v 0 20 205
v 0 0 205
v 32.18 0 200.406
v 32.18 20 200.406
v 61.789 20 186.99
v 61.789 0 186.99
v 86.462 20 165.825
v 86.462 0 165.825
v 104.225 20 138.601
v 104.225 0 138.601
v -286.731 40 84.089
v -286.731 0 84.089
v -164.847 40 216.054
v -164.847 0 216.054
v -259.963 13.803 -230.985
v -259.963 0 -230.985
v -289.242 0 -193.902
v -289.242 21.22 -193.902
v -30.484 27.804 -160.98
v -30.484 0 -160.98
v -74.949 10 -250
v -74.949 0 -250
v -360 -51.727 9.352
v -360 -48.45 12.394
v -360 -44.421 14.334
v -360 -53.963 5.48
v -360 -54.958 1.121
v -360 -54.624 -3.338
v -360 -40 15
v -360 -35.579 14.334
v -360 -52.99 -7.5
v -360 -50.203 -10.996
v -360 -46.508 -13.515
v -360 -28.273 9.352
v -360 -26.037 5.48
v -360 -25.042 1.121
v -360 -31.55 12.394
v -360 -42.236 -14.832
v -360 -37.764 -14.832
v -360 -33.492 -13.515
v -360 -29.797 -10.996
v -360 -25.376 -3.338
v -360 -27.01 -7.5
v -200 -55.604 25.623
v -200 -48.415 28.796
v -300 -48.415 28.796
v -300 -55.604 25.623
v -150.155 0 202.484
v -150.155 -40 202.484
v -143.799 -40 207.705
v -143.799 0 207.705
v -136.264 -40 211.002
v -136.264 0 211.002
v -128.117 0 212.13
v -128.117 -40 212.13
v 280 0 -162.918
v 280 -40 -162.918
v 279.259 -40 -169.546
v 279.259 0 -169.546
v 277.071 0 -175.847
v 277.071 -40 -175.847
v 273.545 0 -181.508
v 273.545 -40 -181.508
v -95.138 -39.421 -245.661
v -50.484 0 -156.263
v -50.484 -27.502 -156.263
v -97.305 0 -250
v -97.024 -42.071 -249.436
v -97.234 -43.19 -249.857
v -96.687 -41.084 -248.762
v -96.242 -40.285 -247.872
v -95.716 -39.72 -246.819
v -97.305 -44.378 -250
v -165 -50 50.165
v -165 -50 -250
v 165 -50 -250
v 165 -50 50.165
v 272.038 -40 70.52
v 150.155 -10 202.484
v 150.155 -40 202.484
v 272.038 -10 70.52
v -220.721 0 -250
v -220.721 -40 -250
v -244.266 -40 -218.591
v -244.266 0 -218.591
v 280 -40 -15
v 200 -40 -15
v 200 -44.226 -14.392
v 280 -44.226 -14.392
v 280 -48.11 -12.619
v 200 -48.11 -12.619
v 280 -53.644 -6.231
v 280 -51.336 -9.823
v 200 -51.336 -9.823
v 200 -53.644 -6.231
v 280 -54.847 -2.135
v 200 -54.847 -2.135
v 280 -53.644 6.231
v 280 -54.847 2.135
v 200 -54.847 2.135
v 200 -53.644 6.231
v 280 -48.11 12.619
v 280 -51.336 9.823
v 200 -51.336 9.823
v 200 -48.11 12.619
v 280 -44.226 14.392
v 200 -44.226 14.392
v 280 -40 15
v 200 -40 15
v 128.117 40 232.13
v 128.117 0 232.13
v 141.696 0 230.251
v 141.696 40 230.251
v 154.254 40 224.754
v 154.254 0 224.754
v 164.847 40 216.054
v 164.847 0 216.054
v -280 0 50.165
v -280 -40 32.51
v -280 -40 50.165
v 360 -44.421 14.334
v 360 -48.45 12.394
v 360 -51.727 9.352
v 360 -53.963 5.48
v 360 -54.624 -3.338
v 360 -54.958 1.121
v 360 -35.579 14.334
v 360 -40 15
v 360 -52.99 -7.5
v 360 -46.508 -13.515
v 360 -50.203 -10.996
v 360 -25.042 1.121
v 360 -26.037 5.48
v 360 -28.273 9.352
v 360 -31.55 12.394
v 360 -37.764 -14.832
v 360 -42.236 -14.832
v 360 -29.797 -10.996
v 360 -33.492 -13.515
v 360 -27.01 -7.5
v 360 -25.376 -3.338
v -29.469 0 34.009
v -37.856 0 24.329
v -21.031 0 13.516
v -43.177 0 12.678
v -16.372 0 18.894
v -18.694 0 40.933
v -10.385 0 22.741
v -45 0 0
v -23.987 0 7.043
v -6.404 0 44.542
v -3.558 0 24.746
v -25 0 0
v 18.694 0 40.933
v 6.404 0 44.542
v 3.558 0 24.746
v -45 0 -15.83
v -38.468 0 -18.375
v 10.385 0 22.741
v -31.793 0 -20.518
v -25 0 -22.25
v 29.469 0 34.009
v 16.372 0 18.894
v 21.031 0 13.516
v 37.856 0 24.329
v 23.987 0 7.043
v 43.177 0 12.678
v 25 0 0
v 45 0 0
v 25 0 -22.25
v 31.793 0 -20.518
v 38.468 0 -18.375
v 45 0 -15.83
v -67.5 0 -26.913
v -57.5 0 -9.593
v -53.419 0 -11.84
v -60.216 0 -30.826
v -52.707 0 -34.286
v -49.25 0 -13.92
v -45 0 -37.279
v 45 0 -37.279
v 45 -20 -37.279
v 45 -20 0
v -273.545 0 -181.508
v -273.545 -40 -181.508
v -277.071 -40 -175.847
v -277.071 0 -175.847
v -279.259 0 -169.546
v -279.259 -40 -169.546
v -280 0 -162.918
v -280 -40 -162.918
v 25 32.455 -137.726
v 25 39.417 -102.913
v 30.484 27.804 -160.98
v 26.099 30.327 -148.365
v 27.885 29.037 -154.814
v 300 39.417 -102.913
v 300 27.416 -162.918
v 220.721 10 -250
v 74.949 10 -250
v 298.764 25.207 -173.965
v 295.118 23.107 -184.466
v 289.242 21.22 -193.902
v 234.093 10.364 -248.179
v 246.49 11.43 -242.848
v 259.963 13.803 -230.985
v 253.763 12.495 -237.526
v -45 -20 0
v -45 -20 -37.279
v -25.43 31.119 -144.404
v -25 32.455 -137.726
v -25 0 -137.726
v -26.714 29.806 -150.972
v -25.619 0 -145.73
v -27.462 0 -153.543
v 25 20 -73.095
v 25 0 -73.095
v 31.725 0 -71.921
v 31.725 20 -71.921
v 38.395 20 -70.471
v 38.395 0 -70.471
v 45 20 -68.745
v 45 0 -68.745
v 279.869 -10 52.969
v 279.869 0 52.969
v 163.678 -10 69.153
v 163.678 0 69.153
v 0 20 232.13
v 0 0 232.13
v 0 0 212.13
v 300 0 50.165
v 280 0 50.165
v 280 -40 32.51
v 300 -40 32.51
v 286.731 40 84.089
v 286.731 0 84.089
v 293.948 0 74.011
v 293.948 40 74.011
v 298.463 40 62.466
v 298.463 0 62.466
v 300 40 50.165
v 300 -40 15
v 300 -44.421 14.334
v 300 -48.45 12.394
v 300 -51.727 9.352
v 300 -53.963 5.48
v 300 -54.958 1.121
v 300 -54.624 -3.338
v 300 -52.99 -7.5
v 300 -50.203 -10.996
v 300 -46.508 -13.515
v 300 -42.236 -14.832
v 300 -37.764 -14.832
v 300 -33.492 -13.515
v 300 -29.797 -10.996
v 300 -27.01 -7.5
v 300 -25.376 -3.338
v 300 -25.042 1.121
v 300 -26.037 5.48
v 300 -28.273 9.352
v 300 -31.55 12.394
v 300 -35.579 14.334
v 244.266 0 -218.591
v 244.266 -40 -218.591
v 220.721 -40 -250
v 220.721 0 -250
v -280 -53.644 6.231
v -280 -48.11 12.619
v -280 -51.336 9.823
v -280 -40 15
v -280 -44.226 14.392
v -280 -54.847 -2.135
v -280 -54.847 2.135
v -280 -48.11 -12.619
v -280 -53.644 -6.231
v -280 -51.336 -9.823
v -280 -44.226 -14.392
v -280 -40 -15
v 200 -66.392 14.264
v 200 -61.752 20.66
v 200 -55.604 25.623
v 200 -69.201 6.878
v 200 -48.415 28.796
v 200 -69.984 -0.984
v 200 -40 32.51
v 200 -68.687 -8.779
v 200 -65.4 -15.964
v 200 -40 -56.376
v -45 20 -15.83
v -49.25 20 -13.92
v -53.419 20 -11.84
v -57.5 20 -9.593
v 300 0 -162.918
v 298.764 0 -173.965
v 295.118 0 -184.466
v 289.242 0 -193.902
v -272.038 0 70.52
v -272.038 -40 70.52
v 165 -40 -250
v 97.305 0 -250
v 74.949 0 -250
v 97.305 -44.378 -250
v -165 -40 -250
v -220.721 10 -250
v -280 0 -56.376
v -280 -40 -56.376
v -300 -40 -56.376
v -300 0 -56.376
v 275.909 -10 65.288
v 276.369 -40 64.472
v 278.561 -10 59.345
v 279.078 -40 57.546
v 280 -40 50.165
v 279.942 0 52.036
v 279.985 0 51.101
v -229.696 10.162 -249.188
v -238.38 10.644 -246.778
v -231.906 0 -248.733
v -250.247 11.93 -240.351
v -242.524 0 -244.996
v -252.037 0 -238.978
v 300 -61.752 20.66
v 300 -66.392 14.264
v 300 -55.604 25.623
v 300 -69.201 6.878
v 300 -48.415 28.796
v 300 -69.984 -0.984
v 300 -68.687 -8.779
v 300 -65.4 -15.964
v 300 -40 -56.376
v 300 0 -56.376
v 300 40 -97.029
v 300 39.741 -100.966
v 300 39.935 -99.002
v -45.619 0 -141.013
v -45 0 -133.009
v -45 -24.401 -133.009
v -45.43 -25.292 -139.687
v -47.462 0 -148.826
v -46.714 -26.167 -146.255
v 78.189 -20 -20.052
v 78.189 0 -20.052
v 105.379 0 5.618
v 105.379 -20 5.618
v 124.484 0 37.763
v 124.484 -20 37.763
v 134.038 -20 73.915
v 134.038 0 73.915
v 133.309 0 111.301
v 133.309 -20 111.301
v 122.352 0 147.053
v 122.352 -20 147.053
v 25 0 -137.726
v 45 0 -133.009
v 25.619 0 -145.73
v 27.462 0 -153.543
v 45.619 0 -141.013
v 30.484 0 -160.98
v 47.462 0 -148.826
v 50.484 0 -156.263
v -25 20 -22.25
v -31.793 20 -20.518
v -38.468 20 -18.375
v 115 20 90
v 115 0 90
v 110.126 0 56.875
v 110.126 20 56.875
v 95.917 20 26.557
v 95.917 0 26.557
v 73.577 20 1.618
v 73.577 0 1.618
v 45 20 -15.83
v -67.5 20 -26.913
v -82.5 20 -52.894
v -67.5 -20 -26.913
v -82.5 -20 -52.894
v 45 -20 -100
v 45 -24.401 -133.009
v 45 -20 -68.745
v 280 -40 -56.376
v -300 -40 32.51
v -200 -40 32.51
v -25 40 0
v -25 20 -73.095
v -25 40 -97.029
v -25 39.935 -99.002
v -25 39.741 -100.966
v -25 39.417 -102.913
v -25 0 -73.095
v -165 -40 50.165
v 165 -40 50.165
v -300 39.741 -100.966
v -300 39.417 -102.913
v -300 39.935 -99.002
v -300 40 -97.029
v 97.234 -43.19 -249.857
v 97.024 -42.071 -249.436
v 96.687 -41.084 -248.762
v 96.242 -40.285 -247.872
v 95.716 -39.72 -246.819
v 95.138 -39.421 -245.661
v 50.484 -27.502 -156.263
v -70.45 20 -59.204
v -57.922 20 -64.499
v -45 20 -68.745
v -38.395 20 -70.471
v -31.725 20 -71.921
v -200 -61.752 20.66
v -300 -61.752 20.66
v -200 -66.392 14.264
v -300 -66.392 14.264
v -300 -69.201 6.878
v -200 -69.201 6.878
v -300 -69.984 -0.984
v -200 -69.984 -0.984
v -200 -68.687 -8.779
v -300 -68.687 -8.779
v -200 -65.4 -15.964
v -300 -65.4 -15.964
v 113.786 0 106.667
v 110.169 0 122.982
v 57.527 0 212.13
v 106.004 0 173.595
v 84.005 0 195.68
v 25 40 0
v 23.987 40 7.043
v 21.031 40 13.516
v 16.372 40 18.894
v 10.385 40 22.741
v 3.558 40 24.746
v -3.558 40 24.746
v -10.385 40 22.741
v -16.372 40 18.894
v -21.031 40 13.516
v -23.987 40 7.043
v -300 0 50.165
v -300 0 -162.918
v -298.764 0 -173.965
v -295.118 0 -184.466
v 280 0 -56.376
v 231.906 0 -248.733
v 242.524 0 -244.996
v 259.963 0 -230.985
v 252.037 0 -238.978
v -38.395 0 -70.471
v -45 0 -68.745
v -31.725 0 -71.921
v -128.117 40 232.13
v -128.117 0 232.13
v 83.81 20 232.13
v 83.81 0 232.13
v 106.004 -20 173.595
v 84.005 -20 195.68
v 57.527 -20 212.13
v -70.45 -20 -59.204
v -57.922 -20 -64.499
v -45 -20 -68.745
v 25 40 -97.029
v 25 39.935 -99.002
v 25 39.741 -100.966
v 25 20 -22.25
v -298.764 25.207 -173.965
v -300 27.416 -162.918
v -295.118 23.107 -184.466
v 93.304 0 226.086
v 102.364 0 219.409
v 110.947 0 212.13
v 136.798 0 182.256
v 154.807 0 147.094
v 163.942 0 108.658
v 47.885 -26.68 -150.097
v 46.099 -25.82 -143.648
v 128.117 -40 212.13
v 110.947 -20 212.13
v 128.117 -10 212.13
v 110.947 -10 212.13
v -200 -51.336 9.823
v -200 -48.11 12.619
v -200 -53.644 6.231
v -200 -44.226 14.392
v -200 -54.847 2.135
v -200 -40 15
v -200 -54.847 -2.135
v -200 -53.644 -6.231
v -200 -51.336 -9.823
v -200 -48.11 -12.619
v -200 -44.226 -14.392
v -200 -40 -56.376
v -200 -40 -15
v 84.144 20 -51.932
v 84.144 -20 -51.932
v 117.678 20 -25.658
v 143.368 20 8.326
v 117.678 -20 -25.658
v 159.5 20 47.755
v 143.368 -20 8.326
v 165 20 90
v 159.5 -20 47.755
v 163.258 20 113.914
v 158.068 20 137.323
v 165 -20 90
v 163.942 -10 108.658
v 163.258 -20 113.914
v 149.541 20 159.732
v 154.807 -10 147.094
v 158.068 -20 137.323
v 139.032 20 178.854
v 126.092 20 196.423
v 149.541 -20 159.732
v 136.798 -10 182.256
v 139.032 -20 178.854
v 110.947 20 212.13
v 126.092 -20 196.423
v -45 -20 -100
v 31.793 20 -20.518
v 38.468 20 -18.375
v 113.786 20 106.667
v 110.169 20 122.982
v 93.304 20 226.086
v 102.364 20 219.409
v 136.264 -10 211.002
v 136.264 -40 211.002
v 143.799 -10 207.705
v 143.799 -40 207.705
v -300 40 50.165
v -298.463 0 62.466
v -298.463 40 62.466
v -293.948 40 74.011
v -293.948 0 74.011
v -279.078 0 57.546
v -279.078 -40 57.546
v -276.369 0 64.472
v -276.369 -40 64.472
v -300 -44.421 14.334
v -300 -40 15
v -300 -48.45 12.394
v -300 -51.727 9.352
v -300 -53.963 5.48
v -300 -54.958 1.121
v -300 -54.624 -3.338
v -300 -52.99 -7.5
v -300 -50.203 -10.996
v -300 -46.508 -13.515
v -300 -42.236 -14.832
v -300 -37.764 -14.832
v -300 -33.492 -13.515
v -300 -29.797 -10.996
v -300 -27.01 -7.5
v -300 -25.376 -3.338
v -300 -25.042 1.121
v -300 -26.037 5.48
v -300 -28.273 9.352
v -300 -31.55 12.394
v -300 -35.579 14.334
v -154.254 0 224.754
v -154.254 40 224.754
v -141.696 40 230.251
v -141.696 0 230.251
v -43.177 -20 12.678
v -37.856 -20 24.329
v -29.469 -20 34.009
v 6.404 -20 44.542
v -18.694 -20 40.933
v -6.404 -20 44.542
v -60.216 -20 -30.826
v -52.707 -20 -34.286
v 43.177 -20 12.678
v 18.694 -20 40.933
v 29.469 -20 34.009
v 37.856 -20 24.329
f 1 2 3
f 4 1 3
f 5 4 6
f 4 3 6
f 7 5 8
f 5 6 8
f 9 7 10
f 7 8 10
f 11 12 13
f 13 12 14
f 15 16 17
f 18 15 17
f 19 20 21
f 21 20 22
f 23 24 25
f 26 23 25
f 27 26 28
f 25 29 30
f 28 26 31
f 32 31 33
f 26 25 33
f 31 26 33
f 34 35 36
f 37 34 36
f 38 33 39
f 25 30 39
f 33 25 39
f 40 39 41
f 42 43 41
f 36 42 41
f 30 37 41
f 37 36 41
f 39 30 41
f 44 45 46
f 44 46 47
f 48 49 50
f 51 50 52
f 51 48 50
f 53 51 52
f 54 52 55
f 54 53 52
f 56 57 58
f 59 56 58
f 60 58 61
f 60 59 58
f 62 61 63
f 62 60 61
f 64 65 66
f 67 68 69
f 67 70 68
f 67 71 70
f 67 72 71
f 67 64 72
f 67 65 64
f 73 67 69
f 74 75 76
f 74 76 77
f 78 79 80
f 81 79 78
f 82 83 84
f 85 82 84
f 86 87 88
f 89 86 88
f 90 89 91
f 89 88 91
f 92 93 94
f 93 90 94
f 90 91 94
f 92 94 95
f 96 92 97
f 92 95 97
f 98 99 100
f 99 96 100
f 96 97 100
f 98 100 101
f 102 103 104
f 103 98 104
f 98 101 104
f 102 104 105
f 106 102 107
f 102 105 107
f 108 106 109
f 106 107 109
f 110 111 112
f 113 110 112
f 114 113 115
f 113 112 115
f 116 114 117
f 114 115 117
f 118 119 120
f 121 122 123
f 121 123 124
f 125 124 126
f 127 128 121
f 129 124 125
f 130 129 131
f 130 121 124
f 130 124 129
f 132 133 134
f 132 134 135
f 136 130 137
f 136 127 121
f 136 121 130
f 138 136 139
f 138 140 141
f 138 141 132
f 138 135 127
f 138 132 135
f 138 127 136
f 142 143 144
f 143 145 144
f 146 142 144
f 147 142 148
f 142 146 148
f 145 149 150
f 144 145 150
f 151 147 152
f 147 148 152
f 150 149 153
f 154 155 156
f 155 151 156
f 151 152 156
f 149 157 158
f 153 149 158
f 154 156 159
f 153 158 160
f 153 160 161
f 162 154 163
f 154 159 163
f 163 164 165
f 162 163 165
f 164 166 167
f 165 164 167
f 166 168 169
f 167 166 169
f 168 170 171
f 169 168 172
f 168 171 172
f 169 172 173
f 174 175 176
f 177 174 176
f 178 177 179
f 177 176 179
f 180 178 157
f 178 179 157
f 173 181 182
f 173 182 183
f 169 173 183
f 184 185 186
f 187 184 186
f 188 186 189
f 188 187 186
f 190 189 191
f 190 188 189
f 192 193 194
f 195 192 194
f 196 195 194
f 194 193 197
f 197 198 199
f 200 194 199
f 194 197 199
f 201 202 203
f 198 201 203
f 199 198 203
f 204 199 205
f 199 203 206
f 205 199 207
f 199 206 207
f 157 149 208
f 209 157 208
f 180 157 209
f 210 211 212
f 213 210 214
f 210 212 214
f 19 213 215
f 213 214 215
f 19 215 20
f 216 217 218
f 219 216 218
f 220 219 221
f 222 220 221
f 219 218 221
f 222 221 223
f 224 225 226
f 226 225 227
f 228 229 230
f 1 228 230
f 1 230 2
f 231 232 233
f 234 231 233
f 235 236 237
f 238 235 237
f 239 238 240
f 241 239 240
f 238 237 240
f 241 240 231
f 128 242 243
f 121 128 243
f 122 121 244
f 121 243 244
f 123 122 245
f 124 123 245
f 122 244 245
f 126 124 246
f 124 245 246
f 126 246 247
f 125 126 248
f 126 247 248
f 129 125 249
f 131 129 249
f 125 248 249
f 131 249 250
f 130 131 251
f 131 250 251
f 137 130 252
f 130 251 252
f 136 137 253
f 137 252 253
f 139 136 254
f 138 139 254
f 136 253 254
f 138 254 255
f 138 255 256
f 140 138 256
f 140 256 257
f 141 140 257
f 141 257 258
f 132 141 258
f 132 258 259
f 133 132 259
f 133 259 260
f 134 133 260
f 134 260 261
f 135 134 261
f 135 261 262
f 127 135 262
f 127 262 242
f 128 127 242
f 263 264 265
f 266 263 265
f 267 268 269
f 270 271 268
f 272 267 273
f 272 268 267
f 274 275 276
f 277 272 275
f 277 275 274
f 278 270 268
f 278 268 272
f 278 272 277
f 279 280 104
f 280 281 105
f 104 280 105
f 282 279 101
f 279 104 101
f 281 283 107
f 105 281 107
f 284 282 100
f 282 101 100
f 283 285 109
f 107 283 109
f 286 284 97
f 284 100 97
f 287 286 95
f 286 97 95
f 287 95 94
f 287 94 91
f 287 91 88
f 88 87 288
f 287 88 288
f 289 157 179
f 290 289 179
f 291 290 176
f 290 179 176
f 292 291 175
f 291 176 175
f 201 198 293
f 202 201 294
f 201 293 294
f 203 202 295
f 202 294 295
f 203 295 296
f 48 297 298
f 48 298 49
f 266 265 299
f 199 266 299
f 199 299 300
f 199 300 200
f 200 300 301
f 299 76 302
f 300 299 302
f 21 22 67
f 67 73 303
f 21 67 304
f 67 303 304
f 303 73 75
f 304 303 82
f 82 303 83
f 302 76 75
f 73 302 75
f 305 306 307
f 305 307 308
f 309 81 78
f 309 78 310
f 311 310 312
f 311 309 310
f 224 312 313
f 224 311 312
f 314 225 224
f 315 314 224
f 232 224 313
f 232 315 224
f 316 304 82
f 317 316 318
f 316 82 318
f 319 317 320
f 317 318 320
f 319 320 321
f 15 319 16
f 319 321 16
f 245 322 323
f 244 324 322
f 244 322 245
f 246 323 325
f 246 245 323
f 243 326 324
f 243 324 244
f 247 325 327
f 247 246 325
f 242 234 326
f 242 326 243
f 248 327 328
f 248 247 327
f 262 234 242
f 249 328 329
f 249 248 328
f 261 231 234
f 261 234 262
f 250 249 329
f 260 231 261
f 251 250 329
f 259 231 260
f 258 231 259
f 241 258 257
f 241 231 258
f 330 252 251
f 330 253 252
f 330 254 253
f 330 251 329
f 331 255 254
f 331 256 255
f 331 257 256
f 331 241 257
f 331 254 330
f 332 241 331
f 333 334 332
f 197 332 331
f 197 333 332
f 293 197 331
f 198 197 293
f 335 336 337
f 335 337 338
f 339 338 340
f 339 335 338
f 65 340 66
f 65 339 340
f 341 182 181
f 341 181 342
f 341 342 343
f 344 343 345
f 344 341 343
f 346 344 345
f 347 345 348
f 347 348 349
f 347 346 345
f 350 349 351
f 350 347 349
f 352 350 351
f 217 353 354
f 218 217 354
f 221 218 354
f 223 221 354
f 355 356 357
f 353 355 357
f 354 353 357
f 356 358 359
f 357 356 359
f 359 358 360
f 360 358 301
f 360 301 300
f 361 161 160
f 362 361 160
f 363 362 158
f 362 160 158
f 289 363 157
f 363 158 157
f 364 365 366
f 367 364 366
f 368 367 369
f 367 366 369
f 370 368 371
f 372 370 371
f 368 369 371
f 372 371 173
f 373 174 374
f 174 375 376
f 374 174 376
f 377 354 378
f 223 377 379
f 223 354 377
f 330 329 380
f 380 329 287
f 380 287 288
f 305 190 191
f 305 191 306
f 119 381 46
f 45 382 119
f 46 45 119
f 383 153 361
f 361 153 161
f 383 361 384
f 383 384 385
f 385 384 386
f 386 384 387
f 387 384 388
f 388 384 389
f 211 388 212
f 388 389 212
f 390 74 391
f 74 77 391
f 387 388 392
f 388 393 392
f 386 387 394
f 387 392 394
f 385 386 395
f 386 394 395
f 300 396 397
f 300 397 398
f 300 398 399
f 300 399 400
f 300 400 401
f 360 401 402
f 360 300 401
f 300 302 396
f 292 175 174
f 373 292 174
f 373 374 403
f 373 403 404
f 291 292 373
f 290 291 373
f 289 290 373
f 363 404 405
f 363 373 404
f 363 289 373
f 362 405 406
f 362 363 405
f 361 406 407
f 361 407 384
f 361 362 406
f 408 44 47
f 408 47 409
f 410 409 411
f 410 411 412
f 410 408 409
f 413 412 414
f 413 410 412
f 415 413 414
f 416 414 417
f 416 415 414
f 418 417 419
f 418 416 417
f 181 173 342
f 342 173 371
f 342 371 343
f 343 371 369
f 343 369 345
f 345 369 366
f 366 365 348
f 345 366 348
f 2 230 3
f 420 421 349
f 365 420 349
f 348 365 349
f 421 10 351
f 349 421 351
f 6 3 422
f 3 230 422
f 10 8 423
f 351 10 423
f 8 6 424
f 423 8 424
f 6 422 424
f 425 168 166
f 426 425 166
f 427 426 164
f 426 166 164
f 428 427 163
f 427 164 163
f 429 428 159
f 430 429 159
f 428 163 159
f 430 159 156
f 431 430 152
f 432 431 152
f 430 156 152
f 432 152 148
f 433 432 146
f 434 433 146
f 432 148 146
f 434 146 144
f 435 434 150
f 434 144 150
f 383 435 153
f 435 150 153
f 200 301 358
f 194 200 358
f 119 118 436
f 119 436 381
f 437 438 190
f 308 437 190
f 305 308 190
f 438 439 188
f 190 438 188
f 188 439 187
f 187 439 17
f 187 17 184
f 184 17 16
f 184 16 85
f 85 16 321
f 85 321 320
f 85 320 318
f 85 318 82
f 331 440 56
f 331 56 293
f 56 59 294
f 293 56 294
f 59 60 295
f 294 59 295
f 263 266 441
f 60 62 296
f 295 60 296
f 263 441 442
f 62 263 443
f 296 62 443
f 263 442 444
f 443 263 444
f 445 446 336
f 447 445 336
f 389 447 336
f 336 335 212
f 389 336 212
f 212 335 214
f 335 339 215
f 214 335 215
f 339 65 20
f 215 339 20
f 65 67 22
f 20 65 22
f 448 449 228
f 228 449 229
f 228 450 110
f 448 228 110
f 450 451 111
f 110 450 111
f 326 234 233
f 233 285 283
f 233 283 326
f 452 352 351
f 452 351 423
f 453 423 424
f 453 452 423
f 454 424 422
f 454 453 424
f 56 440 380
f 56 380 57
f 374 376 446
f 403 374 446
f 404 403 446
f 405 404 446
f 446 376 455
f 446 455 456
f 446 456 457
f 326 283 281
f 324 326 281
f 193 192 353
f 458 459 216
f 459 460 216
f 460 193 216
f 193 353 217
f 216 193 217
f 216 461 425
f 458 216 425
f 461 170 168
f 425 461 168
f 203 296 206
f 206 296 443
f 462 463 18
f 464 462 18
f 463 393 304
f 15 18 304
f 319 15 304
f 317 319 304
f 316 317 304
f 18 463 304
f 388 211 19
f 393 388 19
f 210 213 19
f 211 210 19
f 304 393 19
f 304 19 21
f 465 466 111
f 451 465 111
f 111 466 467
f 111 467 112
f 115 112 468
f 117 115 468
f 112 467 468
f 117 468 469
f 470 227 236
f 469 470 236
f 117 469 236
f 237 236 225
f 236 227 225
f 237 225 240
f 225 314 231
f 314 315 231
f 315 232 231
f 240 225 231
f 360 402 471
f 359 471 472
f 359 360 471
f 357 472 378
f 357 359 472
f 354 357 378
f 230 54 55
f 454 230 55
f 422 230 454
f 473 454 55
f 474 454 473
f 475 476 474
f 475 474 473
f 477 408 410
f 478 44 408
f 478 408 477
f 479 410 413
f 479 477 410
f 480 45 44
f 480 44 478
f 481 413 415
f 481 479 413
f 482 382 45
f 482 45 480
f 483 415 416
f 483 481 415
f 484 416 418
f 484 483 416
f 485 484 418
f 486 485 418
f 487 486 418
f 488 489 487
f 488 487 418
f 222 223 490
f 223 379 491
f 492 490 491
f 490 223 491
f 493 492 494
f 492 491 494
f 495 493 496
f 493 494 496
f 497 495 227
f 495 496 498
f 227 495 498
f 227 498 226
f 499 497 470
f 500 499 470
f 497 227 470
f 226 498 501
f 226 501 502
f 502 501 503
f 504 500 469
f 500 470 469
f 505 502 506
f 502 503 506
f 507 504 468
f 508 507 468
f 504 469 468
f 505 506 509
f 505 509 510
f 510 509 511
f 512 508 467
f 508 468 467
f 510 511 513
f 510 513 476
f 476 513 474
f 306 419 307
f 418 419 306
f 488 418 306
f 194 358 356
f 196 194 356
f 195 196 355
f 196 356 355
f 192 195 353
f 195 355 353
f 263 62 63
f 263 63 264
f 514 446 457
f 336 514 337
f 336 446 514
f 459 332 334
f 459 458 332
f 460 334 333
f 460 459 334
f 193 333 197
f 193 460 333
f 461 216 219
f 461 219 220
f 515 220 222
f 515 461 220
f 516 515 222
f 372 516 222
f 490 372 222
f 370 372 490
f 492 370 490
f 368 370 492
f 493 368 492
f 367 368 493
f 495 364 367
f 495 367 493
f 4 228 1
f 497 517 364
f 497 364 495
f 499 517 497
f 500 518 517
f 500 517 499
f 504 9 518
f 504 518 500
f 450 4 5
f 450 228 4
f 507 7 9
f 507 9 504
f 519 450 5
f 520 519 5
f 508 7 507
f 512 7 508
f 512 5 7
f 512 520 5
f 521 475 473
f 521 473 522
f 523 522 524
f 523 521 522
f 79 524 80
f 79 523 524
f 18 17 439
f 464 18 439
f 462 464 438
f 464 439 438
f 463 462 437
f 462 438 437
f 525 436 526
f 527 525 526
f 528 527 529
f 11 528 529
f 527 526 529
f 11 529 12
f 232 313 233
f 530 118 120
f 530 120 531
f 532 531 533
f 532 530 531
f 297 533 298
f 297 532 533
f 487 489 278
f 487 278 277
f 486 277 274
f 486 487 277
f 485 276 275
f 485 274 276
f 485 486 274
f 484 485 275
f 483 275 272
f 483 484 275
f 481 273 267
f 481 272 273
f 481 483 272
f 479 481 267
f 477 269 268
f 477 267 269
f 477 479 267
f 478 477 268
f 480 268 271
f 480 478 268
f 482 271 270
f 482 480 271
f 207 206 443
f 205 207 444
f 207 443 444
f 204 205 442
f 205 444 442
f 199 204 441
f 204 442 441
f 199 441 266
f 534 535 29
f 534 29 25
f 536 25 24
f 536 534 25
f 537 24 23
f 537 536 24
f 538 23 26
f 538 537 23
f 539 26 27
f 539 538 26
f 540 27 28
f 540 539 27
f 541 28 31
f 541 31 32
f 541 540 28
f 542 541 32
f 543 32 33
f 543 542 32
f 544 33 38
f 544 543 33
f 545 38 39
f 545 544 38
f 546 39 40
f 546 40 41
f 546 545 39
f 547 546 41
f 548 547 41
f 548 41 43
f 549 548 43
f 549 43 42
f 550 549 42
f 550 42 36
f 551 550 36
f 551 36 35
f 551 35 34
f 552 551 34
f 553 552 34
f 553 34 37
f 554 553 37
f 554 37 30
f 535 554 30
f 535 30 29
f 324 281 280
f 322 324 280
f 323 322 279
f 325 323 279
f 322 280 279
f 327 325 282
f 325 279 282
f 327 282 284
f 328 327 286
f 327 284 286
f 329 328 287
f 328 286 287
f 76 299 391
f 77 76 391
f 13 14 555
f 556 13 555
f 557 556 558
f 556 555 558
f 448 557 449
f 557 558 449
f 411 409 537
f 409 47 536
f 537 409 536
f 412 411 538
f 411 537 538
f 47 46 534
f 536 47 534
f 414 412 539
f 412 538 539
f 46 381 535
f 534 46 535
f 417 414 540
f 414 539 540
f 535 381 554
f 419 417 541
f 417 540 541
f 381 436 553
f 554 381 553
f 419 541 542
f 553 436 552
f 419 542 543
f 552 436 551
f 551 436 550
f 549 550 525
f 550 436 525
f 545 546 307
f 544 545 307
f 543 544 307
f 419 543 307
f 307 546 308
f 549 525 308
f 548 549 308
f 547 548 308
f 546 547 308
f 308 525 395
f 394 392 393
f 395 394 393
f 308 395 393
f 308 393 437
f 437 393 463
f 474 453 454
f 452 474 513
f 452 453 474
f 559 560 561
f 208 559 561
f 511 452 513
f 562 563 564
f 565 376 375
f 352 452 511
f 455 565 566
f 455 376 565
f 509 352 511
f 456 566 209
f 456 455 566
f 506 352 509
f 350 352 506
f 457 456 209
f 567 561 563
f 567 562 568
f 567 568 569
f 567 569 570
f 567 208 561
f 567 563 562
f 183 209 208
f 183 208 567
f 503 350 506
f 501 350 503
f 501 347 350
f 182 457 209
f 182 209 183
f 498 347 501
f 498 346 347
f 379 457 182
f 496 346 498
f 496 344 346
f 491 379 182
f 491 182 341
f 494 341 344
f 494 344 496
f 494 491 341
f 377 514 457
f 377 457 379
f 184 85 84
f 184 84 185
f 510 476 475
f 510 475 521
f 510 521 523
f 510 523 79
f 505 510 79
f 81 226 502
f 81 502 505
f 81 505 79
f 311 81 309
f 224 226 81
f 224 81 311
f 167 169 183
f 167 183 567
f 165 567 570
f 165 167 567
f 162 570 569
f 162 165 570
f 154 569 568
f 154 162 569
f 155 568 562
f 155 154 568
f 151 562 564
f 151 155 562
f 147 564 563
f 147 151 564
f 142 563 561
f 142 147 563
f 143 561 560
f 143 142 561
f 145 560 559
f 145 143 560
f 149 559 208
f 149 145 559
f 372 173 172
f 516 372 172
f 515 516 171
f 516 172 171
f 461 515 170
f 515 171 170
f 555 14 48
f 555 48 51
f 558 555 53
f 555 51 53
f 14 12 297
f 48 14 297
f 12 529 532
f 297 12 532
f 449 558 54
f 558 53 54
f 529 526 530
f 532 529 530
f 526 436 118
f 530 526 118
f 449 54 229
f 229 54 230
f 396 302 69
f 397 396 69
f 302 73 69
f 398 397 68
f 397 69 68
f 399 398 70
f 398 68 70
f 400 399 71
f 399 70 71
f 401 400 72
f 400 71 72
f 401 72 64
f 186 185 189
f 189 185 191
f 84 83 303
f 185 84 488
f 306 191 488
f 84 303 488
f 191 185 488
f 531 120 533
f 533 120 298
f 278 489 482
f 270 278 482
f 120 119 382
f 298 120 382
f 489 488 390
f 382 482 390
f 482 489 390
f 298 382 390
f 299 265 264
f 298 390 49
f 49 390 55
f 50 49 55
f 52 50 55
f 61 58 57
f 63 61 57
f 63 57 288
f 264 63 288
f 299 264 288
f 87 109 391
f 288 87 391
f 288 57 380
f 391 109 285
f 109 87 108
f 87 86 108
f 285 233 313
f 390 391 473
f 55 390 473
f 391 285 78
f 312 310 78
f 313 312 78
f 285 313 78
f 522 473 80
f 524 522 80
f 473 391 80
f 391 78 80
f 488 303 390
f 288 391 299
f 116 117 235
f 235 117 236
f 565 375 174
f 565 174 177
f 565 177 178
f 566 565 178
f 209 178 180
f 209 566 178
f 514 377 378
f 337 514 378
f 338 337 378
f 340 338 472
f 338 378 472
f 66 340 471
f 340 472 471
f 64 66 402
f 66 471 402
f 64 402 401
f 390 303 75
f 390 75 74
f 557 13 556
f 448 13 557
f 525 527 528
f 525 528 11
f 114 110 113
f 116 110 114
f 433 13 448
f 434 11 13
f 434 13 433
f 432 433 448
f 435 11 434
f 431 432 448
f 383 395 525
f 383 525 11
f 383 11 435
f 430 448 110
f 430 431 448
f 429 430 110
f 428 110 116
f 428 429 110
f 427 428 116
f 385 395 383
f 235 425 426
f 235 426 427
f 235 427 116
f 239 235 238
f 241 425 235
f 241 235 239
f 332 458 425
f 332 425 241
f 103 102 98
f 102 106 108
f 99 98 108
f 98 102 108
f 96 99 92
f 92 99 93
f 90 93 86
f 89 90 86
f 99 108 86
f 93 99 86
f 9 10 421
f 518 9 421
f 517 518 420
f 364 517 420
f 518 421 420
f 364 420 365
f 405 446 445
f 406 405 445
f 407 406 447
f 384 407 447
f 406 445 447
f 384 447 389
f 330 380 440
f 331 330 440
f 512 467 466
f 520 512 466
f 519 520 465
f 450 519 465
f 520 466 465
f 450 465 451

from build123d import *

# Parameters (mm, degrees)
BOSS_EXTRUDE1_DEPTH = 40
BOSS_EXTRUDE2_DEPTH = 40
CUT_EXTRUDE1_DEPTH  = 340
FILLET1_R           = 30
BOSS_EXTRUDE3_DEPTH = 165
FILLET2_R           = 5
BOSS_EXTRUDE4_START = -80
BOSS_EXTRUDE4_DEPTH = 100
BOSS_EXTRUDE5_DEPTH = 80
CUT_EXTRUDE2_DEPTH  = 20
CUT_EXTRUDE3_DEPTH  = 20
CUT_EXTRUDE4_DEPTH  = 10


with BuildPart() as part:
    # Sketch1 → Boss-Extrude1 (new body)
    with BuildSketch(Plane(origin=(0, 0, 0), x_dir=(1, 0, 0), z_dir=(0, 1, 0))):
        with BuildLine():
            Line((-25, 0), (-25, 137.726414563))
            ThreePointArc((-25, 137.726414563), (-26.389662789, 149.672244603), (-30.484431688, 160.980068695))
            Line((-30.484431688, 160.980068695), (-74.948974278, 250))
            Line((-74.948974278, 250), (-220.720785685, 250))
            ThreePointArc((-220.720785685, 250), (-242.524087913, 244.995733264), (-259.963008538, 230.984640477))
            Line((-259.963008538, 230.984640477), (-289.242222854, 193.902349528))
            ThreePointArc((-289.242222854, 193.902349528), (-297.234050973, 179.317234308), (-300, 162.917709051))
            Line((-300, 162.917709051), (-300, -50.165054409))
            ThreePointArc((-300, -50.165054409), (-296.564614821, -68.378693434), (-286.730534139, -84.089497837))
            Line((-286.730534139, -84.089497837), (-164.847437487, -216.05426395))
            ThreePointArc((-164.847437487, -216.05426395), (-148.164070588, -227.93496309), (-128.116903349, -232.129820522))
            Line((-128.116903349, -232.129820522), (128.116903349, -232.129820522))
            ThreePointArc((128.116903349, -232.129820522), (148.164070588, -227.93496309), (164.847437487, -216.05426395))
            Line((164.847437487, -216.05426395), (286.730534139, -84.089497837))
            ThreePointArc((286.730534139, -84.089497837), (296.564614821, -68.378693434), (300, -50.165054409))
            Line((300, -50.165054409), (300, 162.917709051))
            ThreePointArc((300, 162.917709051), (297.234050973, 179.317234308), (289.242222854, 193.902349528))
            Line((289.242222854, 193.902349528), (259.963008538, 230.984640477))
            ThreePointArc((259.963008538, 230.984640477), (242.524087913, 244.995733264), (220.720785685, 250))
            Line((220.720785685, 250), (74.948974278, 250))
            Line((74.948974278, 250), (30.484431688, 160.980068695))
            ThreePointArc((30.484431688, 160.980068695), (26.389662789, 149.672244603), (25, 137.726414563))
            Line((25, 137.726414563), (25, 0))
            ThreePointArc((25, 0), (0, -25), (-25, 0))
        make_face()
    extrude(amount=BOSS_EXTRUDE1_DEPTH)

    # Sketch1<4> → Boss-Extrude2 (add)
    with BuildSketch(Plane(origin=(0, 0, 0), x_dir=(1, 0, 0), z_dir=(0, 1, 0))):
        with BuildLine():
            Line((-50.484431688, 156.26301936), (-97.305092037, 250))
            Line((-97.305092037, 250), (-220.720785685, 250))
            Line((-220.720785685, 250), (-244.266119397, 218.590784286))
            Line((-244.266119397, 218.590784286), (-273.545333712, 181.508493337))
            ThreePointArc((-273.545333712, 181.508493337), (-278.340430584, 172.757424205), (-280, 162.917709051))
            Line((-280, 162.917709051), (-280, -50.165054409))
            ThreePointArc((-280, -50.165054409), (-277.938768893, -61.093237824), (-272.038320483, -70.519720466))
            Line((-272.038320483, -70.519720466), (-150.155223832, -202.484486579))
            ThreePointArc((-150.155223832, -202.484486579), (-140.145203692, -209.612906063), (-128.116903349, -212.129820522))
            Line((-128.116903349, -212.129820522), (128.116903349, -212.129820522))
            ThreePointArc((128.116903349, -212.129820522), (140.145203692, -209.612906063), (150.155223832, -202.484486579))
            Line((150.155223832, -202.484486579), (272.038320483, -70.519720466))
            ThreePointArc((272.038320483, -70.519720466), (277.938768893, -61.093237824), (280, -50.165054409))
            Line((280, -50.165054409), (280, 162.917709051))
            ThreePointArc((280, 162.917709051), (278.340430584, 172.757424205), (273.545333712, 181.508493337))
            Line((273.545333712, 181.508493337), (244.266119397, 218.590784286))
            Line((244.266119397, 218.590784286), (220.720785685, 250))
            Line((220.720785685, 250), (97.305092037, 250))
            Line((97.305092037, 250), (50.484431688, 156.26301936))
            ThreePointArc((50.484431688, 156.26301936), (46.389662789, 144.955195268), (45, 133.009365228))
            Line((45, 133.009365228), (45, 0))
            ThreePointArc((45, 0), (0, -45), (-45, 0))
            Line((-45, 0), (-45, 133.009365228))
            ThreePointArc((-45, 133.009365228), (-46.389662789, 144.955195268), (-50.484431688, 156.26301936))
        make_face()
    extrude(amount=-BOSS_EXTRUDE2_DEPTH)

    # Sketch2 → Cut-Extrude1 (cut, symmetric)
    with BuildSketch(Plane(origin=(0, 0, 0), x_dir=(0, 0, -1), z_dir=(1, 0, 0))):
        Polygon((100, 40), (250, 10), (250, 40), align=None)
    extrude(amount=CUT_EXTRUDE1_DEPTH, both=True, mode=Mode.SUBTRACT)

    # Fillet1
    fillet1_edges = [part.edges().sort_by_distance(p)[0] for p in [
        (162.5, 40, -100),
        (-162.5, 40, -100),
    ]]
    fillet(fillet1_edges, radius=FILLET1_R)

    # Sketch3 → Boss-Extrude3 (add, symmetric)
    with BuildSketch(Plane(origin=(0, 0, 0), x_dir=(0, 0, -1), z_dir=(1, 0, 0))):
        Polygon((-181.922721763, -20), (100, -20), (250, -40), (250, -50), (-50.165054409, -50), (-50.165054409, -40), (-181.922721763, -40), align=None)
    extrude(amount=BOSS_EXTRUDE3_DEPTH, both=True)

    # Fillet2
    fillet2_edges = [part.edges().sort_by_distance(p)[0] for p in [
        (0, -40, -250),
    ]]
    fillet(fillet2_edges, radius=FILLET2_R)

    # Sketch4 → Boss-Extrude4 (add)
    with BuildSketch(Plane(origin=(280, 0, 0), x_dir=(0, 0, -1), z_dir=(1, 0, 0)).offset(BOSS_EXTRUDE4_START)):
        with BuildLine():
            Line((15, -40), (56.376327321, -40))
            Line((56.376327321, -40), (56.376327321, 0))
            Line((56.376327321, 0), (-50.165054409, 0))
            Line((-50.165054409, 0), (-32.50986797, -40))
            Line((-32.50986797, -40), (-15, -40))
            ThreePointArc((-15, -40), (0, -25), (15, -40))
        make_face()
        with BuildLine():
            ThreePointArc((-25.62265212, -55.603836013), (-6.878338127, -69.200829862), (15.964147414, -65.399724356))
            Line((15.964147414, -65.399724356), (56.376327321, -40))
            Line((56.376327321, -40), (15, -40))
            ThreePointArc((15, -40), (0, -55), (-15, -40))
            Line((-15, -40), (-32.50986797, -40))
            Line((-32.50986797, -40), (-28.795547553, -48.41525051))
            Line((-28.795547553, -48.41525051), (-25.62265212, -55.603836013))
        make_face()
    boss_extrude4 = extrude(amount=BOSS_EXTRUDE4_DEPTH)

    # Sketch4<3> → Boss-Extrude5 (add)
    with BuildSketch(Plane(origin=(280, 0, 0), x_dir=(0, 0, -1), z_dir=(1, 0, 0))):
        with BuildLine():
            Line((-15, -40), (15, -40))
            ThreePointArc((15, -40), (0, -25), (-15, -40))
        make_face()
        with BuildLine():
            ThreePointArc((-15, -40), (0, -55), (15, -40))
            Line((15, -40), (-15, -40))
        make_face()
    boss_extrude5 = extrude(amount=BOSS_EXTRUDE5_DEPTH)

    # Mirror1: Boss-Extrude4, Boss-Extrude5 across plane
    add(boss_extrude4.mirror(Plane(origin=(0, 0, 0), x_dir=(0, 0, 1), z_dir=(1, 0, 0))))
    add(boss_extrude5.mirror(Plane(origin=(0, 0, 0), x_dir=(0, 0, 1), z_dir=(1, 0, 0))))

    # Sketch5 → Cut-Extrude2 (cut)
    with BuildSketch(Plane(origin=(0, -20, 0), x_dir=(1, 0, 0), z_dir=(0, 1, 0))):
        with BuildLine():
            ThreePointArc((-6.81e-07, 45), (22.828766792, 43.055805611), (45, 37.279220614))
            Line((45, 37.279220614), (45, 68.745078664))
            ThreePointArc((45, 68.745078664), (0, 75), (-45, 68.745078664))
            Line((-45, 68.745078664), (-45, 37.279220614))
            ThreePointArc((-45, 37.279220614), (-22.828767464, 43.055805496), (-6.81e-07, 45))
        make_face()
        with BuildLine():
            Line((-82.5, 52.894191624), (-67.5, 26.913429511))
            ThreePointArc((-67.5, 26.913429511), (-56.48827229, 32.613519213), (-45, 37.279220614))
            Line((-45, 37.279220614), (-45, 68.745078664))
            ThreePointArc((-45, 68.745078664), (-64.240759296, 61.980672604), (-82.5, 52.894191624))
        make_face()
        with BuildLine():
            ThreePointArc((45, 37.279220614), (124.484015856, -37.762754702), (122.35155125, -147.053465335))
            Line((122.35155125, -147.053465335), (149.540784861, -159.732013187))
            ThreePointArc((149.540784861, -159.732013187), (161.088841175, -125.7125363), (165, -90))
            ThreePointArc((165, -90), (131.624465811, 9.498743711), (45, 68.745078664))
            Line((45, 68.745078664), (45, 37.279220614))
        make_face()
        with BuildLine():
            ThreePointArc((122.35155125, -147.053465335), (72.535447127, -203.857845185), (0, -225))
            Line((0, -225), (0, -255))
            ThreePointArc((0, -255), (88.654435377, -229.159588559), (149.540784861, -159.732013187))
            Line((149.540784861, -159.732013187), (122.35155125, -147.053465335))
        make_face()
    extrude(amount=CUT_EXTRUDE2_DEPTH, mode=Mode.SUBTRACT)

    # Sketch6 → Cut-Extrude3 (cut)
    with BuildSketch(Plane.XZ):
        with BuildLine():
            ThreePointArc((7.7e-08, -25), (-12.57541279, -24.31036258), (-25, -22.249721603))
            Line((-25, -22.249721603), (-25, -73.095064303))
            ThreePointArc((-25, -73.095064303), (0, -75), (25, -73.095064303))
            Line((25, -73.095064303), (25, -22.249721603))
            ThreePointArc((25, -22.249721603), (12.575412867, -24.310362571), (7.7e-08, -25))
        make_face()
        with BuildLine():
            ThreePointArc((-45, -37.279220614), (-56.48827229, -32.613519213), (-67.5, -26.913429511))
            Line((-67.5, -26.913429511), (-82.5, -52.894191624))
            ThreePointArc((-82.5, -52.894191624), (-64.240759296, -61.980672604), (-45, -68.745078664))
            ThreePointArc((-45, -68.745078664), (-35.067514793, -71.23048535), (-25, -73.095064303))
            Line((-25, -73.095064303), (-25, -22.249721603))
            ThreePointArc((-25, -22.249721603), (-35.14687807, -19.497474683), (-45, -15.830052443))
            Line((-45, -15.830052443), (-45, -37.279220614))
        make_face()
        with BuildLine():
            Line((149.540784861, 159.732013187), (122.35155125, 147.053465335))
            ThreePointArc((122.35155125, 147.053465335), (124.484015856, 37.762754702), (45, -37.279220614))
            Line((45, -37.279220614), (45, -15.830052443))
            ThreePointArc((45, -15.830052443), (35.14687807, -19.497474683), (25, -22.249721603))
            Line((25, -22.249721603), (25, -73.095064303))
            ThreePointArc((25, -73.095064303), (35.067514793, -71.23048535), (45, -68.745078664))
            ThreePointArc((45, -68.745078664), (131.624465811, -9.498743711), (165, 90))
            ThreePointArc((165, 90), (161.088841175, 125.7125363), (149.540784861, 159.732013187))
        make_face()
        with BuildLine():
            ThreePointArc((57.526575939, 212.129820522), (95.64396563, 185.274507811), (122.35155125, 147.053465335))
            Line((122.35155125, 147.053465335), (149.540784861, 159.732013187))
            ThreePointArc((149.540784861, 159.732013187), (132.852908259, 187.852464288), (110.947316053, 212.129820522))
            ThreePointArc((110.947316053, 212.129820522), (97.890765079, 222.824689392), (83.809988178, 232.129820522))
            Line((83.809988178, 232.129820522), (0, 232.129820522))
            Line((0, 232.129820522), (0, 212.129820522))
            Line((0, 212.129820522), (57.526575939, 212.129820522))
        make_face()
        with BuildLine():
            ThreePointArc((0, 205), (61.78945496, 186.990016268), (104.225395509, 138.6011001))
            Line((104.225395509, 138.6011001), (122.35155125, 147.053465335))
            ThreePointArc((122.35155125, 147.053465335), (95.64396563, 185.274507811), (57.526575939, 212.129820522))
            Line((57.526575939, 212.129820522), (0, 212.129820522))
            Line((0, 212.129820522), (0, 205))
        make_face()
        with BuildLine():
            Line((122.35155125, 147.053465335), (104.225395509, 138.6011001))
            ThreePointArc((104.225395509, 138.6011001), (112.274040819, 114.890555603), (115, 90))
            ThreePointArc((115, 90), (95.916630466, 26.557112298), (45, -15.830052443))
            Line((45, -15.830052443), (45, -37.279220614))
            ThreePointArc((45, -37.279220614), (124.484015856, 37.762754702), (122.35155125, 147.053465335))
        make_face()
        with BuildLine():
            ThreePointArc((-45, -15.830052443), (-51.344794778, -12.901467673), (-57.5, -9.592921435))
            Line((-57.5, -9.592921435), (-67.5, -26.913429511))
            ThreePointArc((-67.5, -26.913429511), (-56.48827229, -32.613519213), (-45, -37.279220614))
            Line((-45, -37.279220614), (-45, -15.830052443))
        make_face()
        with BuildLine():
            Line((-83.809988178, 232.129820522), (0, 232.129820522))
            Line((0, 232.129820522), (0, 255))
            ThreePointArc((0, 255), (-43.43719382, 249.179804602), (-83.809988178, 232.129820522))
        make_face()
        with BuildLine():
            Line((0, 255), (0, 232.129820522))
            Line((0, 232.129820522), (83.809988178, 232.129820522))
            ThreePointArc((83.809988178, 232.129820522), (43.43719382, 249.179804602), (0, 255))
        make_face()
    extrude(amount=-CUT_EXTRUDE3_DEPTH, mode=Mode.SUBTRACT)

    # Sketch7 → Cut-Extrude4 (cut)
    with BuildSketch(Plane(origin=(0, 0, 0), x_dir=(1, 0, 0), z_dir=(0, 1, 0))):
        Polygon((300, -50.165054409), (163.677759593, -69.153153364), (68.370461669, -258.499505871), (208.609391352, -264.686517475), (324.100274621, -68.378693434), align=None)
    extrude(amount=-CUT_EXTRUDE4_DEPTH, mode=Mode.SUBTRACT)


solid = part.part
